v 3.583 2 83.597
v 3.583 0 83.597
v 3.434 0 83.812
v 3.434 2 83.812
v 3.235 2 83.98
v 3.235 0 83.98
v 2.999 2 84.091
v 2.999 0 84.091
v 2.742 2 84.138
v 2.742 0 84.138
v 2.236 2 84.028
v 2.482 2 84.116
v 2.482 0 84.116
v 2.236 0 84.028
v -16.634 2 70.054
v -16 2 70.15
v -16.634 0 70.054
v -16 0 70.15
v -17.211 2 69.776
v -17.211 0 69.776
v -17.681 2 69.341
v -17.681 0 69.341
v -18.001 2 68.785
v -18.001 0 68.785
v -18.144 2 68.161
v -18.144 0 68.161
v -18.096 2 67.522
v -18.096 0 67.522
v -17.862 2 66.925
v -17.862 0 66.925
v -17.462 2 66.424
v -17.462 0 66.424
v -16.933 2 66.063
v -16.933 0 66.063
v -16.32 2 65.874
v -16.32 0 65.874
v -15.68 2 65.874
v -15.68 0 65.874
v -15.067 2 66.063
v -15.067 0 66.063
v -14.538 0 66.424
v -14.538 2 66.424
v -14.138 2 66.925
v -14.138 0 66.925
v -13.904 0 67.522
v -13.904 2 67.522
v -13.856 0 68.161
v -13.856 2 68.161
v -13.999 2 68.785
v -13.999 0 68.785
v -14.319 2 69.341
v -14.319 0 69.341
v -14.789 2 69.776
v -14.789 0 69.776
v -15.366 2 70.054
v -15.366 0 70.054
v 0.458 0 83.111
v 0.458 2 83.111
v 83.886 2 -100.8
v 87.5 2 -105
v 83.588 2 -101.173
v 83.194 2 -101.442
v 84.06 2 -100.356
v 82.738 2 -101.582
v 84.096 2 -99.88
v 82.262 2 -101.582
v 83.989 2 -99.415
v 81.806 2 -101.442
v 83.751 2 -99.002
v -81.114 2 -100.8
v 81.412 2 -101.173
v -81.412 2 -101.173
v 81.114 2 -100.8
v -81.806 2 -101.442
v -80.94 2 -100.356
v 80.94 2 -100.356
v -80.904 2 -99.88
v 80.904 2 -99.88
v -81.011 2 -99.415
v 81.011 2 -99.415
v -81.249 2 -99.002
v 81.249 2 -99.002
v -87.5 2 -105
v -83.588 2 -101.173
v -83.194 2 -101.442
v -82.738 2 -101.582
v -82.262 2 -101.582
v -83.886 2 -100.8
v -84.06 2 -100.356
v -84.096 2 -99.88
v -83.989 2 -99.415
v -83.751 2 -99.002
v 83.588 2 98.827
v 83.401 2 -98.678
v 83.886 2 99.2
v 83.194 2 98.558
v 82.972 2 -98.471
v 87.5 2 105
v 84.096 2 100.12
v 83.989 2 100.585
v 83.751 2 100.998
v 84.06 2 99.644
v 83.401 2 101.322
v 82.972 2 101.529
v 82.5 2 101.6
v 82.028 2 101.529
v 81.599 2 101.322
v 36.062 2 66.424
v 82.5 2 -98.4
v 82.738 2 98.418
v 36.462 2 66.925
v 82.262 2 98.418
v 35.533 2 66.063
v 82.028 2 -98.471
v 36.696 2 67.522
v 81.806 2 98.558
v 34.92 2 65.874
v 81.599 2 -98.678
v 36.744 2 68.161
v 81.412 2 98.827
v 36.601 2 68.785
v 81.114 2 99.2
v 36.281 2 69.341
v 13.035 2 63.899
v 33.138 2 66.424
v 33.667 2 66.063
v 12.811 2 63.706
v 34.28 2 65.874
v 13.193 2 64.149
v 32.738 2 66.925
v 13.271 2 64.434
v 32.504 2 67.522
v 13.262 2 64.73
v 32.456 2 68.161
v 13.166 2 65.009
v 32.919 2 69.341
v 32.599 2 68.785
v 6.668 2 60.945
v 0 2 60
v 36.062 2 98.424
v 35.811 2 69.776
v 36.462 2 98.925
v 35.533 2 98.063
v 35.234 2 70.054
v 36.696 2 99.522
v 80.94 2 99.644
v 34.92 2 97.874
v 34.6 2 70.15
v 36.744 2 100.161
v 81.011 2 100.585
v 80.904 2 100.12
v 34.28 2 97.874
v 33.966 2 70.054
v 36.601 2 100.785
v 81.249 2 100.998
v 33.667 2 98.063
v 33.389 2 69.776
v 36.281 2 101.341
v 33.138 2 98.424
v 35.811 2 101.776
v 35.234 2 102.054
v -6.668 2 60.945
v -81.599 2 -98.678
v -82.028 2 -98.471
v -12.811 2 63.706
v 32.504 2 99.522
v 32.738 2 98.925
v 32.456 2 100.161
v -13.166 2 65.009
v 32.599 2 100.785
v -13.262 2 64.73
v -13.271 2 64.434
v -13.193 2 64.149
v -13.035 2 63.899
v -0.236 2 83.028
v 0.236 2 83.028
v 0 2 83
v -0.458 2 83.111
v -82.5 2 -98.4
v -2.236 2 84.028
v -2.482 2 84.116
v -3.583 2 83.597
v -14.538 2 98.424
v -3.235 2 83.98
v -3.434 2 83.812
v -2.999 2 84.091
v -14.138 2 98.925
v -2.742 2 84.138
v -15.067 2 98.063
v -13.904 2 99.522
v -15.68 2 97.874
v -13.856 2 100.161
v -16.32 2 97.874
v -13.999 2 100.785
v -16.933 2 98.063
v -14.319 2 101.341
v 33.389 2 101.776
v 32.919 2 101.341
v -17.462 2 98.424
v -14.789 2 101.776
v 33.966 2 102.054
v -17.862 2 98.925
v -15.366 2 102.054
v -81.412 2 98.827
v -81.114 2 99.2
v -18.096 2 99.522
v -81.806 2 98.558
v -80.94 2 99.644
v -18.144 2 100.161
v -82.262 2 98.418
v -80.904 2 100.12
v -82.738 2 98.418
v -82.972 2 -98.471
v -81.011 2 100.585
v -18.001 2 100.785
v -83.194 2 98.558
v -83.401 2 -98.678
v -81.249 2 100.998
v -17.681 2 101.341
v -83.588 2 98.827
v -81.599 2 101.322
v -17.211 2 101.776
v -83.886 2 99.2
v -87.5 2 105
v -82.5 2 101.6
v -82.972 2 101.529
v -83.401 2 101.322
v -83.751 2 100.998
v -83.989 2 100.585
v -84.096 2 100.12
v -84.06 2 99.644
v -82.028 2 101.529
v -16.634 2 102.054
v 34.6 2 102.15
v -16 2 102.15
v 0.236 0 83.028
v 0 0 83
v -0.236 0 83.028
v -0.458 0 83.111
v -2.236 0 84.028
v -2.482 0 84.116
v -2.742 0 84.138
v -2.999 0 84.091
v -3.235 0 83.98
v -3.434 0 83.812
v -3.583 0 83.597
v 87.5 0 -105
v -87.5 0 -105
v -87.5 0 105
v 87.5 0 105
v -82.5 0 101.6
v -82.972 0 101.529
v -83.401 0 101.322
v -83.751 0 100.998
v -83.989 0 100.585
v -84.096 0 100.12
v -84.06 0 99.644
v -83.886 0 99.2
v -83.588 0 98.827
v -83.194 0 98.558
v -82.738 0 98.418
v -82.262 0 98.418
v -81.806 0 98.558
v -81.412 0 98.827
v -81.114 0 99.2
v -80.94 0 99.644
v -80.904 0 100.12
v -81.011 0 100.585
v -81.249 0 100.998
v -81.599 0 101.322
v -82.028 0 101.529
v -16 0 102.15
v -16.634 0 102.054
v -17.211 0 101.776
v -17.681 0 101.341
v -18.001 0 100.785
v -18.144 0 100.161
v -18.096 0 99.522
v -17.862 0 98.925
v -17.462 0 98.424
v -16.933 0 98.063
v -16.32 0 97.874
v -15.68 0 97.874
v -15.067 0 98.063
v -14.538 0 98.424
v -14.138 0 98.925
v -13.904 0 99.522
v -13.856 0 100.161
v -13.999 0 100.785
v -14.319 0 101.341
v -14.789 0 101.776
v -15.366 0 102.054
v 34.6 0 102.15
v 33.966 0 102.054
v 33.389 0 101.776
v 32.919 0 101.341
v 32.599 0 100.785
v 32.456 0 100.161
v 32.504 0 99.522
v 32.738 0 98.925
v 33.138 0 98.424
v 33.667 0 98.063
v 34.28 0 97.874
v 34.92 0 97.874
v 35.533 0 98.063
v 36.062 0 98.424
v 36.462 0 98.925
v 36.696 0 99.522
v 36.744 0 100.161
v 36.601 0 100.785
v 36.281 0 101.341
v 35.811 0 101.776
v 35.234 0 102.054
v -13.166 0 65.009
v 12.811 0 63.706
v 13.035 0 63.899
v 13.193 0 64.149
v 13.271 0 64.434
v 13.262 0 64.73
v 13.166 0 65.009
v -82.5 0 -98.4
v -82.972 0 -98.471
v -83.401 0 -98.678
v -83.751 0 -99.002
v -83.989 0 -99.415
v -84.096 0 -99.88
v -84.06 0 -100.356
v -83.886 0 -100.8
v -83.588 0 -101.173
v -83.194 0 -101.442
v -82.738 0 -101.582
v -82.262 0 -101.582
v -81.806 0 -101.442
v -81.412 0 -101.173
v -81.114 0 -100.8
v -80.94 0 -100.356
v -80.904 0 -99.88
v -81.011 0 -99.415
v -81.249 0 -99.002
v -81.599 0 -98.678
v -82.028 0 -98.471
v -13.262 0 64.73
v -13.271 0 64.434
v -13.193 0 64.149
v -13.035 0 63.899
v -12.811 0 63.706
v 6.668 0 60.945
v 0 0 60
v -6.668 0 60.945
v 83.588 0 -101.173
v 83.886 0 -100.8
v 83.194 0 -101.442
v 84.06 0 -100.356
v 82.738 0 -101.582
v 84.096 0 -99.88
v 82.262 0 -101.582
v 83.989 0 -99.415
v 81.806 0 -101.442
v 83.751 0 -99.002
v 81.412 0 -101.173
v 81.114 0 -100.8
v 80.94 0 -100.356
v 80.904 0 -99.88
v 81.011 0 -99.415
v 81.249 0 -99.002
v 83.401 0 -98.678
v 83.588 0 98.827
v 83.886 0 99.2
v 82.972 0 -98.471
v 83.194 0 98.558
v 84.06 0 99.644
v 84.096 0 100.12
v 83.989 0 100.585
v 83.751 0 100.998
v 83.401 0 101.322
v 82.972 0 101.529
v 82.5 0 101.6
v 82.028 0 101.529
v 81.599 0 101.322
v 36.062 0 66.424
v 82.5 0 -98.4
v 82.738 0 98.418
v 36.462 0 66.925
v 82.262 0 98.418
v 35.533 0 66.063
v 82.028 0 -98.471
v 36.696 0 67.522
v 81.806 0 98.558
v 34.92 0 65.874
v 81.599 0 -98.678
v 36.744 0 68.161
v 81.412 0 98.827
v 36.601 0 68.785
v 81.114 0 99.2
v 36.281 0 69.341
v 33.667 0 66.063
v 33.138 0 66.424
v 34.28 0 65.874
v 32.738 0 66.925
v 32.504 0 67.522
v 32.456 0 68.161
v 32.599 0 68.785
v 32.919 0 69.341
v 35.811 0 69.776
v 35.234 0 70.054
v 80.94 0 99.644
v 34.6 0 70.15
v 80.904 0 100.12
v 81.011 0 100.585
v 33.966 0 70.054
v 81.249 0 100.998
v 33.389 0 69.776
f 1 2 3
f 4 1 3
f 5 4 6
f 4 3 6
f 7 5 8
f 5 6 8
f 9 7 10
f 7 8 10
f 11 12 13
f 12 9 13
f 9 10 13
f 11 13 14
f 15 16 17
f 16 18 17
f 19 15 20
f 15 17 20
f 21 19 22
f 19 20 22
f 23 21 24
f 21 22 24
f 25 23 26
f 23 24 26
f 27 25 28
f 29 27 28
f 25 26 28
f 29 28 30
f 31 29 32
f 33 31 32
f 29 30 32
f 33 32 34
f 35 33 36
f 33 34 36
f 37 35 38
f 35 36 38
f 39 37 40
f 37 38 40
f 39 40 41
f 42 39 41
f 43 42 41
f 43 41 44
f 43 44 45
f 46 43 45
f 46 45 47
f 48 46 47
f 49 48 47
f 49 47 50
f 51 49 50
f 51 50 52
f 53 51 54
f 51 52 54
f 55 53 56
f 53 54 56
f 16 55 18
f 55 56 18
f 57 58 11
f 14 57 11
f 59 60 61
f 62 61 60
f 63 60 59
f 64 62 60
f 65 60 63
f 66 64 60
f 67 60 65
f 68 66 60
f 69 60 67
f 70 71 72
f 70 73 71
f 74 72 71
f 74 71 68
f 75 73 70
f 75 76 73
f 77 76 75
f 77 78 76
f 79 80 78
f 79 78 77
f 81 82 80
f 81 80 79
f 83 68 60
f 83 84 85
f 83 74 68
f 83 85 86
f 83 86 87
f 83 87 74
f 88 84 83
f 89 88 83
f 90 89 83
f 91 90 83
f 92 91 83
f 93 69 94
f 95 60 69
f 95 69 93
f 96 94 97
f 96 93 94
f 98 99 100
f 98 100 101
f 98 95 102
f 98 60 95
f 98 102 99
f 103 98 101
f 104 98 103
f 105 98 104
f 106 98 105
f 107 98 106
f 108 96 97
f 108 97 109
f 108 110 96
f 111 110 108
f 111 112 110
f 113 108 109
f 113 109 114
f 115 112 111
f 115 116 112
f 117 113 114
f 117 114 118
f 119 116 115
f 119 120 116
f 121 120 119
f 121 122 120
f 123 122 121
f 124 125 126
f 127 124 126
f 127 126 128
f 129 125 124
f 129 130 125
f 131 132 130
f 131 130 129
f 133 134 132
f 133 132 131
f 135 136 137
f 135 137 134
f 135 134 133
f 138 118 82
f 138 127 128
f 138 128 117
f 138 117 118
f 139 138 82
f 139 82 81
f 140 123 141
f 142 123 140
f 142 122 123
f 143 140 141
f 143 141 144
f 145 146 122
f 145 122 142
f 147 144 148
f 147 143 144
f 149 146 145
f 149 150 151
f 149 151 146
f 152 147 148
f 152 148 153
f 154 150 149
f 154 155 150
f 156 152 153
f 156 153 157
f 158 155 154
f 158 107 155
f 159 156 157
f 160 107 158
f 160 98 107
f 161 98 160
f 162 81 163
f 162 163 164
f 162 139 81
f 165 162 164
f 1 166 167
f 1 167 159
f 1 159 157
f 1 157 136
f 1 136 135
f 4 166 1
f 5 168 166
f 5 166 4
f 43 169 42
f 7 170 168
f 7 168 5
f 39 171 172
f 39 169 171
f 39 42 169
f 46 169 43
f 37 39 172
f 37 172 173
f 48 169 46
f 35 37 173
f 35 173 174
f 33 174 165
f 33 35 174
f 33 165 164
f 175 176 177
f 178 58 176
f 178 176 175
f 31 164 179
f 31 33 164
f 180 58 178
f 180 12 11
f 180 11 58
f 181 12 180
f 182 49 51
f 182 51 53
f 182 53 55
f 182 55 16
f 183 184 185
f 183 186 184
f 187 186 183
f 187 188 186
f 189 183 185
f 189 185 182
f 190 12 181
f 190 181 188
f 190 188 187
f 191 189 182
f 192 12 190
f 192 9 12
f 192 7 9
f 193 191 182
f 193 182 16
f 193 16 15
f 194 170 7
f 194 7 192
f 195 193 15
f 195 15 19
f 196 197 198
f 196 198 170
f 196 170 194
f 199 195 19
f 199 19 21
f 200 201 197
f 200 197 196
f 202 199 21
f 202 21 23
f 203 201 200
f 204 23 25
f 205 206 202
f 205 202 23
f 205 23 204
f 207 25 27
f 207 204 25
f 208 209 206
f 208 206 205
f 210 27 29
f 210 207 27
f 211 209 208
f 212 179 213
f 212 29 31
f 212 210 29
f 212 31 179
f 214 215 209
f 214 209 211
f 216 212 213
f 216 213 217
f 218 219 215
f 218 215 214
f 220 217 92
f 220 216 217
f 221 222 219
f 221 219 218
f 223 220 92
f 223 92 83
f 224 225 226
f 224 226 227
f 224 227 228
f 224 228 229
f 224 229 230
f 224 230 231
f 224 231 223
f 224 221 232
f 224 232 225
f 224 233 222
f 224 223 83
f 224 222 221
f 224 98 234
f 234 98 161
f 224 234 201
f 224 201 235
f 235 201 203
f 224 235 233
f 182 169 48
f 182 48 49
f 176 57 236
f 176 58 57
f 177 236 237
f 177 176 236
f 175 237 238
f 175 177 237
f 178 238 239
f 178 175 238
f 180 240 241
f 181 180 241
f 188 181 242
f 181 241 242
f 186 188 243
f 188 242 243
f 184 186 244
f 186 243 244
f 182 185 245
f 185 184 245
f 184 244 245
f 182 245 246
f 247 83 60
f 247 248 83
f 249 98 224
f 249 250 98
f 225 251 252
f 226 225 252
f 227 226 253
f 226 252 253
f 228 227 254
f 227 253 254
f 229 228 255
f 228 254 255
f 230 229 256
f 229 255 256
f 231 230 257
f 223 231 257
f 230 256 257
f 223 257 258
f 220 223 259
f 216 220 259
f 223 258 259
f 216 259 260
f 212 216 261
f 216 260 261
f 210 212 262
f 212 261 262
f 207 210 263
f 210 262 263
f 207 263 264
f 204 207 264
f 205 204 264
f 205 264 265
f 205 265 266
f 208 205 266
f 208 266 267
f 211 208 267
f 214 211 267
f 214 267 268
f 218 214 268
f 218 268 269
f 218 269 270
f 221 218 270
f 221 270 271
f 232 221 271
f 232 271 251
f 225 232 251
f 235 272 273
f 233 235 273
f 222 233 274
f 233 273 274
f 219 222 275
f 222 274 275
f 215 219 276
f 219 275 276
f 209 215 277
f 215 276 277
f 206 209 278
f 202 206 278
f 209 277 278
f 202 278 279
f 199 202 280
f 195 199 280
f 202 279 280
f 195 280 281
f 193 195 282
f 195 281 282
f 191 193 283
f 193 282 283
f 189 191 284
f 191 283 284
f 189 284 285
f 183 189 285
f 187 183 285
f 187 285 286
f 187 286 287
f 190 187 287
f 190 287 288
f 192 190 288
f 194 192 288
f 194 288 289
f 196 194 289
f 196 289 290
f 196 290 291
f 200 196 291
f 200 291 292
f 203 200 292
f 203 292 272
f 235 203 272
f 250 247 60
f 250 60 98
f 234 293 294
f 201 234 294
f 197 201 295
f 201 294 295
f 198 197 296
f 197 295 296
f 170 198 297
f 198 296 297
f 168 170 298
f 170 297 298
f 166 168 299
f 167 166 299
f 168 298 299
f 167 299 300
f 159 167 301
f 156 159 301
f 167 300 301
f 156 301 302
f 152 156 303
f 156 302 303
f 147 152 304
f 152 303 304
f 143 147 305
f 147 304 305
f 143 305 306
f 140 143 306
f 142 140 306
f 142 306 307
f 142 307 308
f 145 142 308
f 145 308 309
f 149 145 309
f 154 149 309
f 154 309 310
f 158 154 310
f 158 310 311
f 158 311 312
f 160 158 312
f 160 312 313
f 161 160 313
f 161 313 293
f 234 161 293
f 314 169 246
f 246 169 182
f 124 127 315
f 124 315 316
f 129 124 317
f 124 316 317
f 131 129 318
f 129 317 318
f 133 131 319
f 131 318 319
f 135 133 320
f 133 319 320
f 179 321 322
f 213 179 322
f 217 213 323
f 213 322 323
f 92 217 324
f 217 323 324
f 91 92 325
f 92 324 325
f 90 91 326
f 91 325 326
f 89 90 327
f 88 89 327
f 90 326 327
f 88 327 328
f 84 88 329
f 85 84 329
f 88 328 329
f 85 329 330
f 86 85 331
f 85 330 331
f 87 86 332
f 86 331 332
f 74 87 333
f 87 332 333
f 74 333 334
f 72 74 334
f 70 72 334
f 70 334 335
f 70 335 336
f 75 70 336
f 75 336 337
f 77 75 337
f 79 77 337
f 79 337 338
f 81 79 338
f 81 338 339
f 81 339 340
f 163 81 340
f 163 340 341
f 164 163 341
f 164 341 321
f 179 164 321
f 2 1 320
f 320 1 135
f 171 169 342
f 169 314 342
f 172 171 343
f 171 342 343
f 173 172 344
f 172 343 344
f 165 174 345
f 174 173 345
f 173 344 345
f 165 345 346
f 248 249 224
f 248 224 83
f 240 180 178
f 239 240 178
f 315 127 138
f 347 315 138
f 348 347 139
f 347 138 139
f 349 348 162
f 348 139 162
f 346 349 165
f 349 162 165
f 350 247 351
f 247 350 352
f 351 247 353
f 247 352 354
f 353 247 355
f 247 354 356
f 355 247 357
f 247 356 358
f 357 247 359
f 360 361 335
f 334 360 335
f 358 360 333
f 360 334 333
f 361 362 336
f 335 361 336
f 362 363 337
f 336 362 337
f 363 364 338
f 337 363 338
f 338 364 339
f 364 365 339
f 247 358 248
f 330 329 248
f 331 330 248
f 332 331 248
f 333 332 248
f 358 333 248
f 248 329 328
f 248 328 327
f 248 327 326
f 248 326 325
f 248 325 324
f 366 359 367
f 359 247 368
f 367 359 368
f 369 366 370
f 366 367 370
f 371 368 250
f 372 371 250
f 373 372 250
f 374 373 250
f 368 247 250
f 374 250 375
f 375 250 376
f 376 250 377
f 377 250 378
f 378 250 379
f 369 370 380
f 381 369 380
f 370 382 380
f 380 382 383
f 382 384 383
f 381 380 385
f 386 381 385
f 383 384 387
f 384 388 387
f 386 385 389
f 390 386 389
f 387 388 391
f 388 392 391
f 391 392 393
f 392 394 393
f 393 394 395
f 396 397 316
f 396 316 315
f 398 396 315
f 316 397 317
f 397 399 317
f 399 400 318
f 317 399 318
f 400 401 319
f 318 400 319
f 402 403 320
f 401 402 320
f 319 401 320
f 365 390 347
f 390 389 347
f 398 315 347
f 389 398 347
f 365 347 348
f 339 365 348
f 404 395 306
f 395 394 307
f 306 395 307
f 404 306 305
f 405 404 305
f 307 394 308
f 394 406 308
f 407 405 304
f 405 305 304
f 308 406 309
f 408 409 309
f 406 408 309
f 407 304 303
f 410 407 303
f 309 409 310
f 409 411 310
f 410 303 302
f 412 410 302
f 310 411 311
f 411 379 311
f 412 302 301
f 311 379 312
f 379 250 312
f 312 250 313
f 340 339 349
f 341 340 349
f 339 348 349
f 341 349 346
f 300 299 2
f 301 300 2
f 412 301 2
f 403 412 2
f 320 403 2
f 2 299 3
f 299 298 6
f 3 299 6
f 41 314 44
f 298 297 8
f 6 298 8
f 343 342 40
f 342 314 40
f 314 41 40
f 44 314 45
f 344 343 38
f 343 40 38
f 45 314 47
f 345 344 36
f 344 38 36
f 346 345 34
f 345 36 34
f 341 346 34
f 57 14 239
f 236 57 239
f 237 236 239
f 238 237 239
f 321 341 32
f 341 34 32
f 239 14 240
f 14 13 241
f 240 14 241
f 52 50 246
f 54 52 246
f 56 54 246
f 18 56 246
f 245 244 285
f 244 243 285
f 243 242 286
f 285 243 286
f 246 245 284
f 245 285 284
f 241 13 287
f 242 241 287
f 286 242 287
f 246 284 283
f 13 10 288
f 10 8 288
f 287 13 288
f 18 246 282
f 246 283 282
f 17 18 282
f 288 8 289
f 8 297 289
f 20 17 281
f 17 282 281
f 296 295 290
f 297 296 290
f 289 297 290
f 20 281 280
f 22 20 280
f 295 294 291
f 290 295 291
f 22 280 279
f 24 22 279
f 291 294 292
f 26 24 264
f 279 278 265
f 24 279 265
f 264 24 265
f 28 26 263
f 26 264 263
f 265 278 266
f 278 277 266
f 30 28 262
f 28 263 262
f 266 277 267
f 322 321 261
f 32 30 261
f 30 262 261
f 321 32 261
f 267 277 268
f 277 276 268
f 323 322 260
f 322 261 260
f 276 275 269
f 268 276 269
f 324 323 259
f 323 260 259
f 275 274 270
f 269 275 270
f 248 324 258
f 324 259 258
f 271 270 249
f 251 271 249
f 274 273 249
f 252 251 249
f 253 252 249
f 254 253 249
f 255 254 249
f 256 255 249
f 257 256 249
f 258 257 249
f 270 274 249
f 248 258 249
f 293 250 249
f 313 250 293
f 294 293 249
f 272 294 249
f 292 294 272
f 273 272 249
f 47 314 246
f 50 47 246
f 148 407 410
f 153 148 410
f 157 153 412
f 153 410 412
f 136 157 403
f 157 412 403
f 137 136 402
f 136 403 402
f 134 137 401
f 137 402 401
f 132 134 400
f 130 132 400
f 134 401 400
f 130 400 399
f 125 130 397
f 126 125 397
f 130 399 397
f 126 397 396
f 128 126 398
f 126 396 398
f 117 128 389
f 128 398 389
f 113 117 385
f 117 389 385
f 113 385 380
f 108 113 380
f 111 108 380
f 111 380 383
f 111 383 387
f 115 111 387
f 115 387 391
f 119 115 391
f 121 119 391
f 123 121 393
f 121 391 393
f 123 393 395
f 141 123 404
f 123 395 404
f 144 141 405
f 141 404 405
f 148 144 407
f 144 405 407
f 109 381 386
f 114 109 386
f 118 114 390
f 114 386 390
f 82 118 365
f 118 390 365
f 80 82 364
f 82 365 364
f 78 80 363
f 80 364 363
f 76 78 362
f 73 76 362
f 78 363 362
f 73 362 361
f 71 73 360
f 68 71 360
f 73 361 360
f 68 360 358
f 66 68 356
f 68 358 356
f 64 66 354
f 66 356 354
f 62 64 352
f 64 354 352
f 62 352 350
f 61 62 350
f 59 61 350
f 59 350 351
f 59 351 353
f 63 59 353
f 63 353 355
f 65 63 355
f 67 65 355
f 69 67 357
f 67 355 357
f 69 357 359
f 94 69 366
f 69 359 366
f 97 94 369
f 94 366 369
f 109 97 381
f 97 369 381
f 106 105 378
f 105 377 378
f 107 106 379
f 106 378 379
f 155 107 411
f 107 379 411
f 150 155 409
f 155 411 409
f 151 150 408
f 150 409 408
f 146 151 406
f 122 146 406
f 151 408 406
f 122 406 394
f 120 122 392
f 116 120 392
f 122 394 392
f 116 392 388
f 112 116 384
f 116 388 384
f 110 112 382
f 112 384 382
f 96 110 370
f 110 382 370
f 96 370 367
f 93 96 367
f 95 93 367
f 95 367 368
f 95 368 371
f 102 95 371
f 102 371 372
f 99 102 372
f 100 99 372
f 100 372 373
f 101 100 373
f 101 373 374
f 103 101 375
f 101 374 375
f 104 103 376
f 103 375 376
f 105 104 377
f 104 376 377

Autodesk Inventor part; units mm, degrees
ref_plane "YZ Plane" through (0, 0, 0) normal (1, 0, 0) x (0, 1, 0)
ref_plane "XZ Plane" through (0, 0, 0) normal (0, 1, 0) x (-1, 0, 0)
ref_plane "XY Plane" through (0, 0, 0) normal (0, 0, 1) x (1, 0, 0)
sketch "スケッチ1" plane through (0, 0, 0) normal (0, 1, 0) x (-1, 0, 0)
  line L0 (-87.5, 105) -> (87.5, 105)
  line L1 (87.5, 105) -> (87.5, -105)
  line L2 (87.5, -105) -> (-87.5, -105)
  line L3 (-87.5, -105) -> (-87.5, 105)
  line L4 (-87.5, 105) -> (87.5, -105) construction
  line L5 (87.5, 105) -> (-87.5, -105) construction
  point P0 (0, 0)
  dimension "d0" = 210
  dimension "d1" = 175
extrude "プレート1" add sketch "スケッチ1" along normal blind 2
sketch "スケッチ5" plane through (0, 2, 0) normal (0, 1, 0) x (1, 0, 0)
  line L0 (-16, -100) -> (34.6, -100)
  line L1 (34.6, -100) -> (34.6, -68)
  line L2 (34.6, -68) -> (-16, -68)
  line L3 (-16, -68) -> (-16, -100)
  line L4 (-16, -100) -> (34.6, -68) construction
  line L5 (34.6, -100) -> (-16, -68) construction
  line L6 (87.5, -105) -> (-87.5, -105) projected
  point P0 (0, 0)
  point P1 (0, -84)
  point P2 (9.3, -84)
  point P3 (9.3, -84)
  dimension "d31" = 50.6
  dimension "d32" = 16
  dimension "d33" = 32
  dimension "d34" = 21
hole "穴3" at (34.6, 2, 68) at (34.6, 2, 100) at (-16, 2, 68) at (-16, 2, 100) direction (0, -1, 0) diameter 4.3 end through all clearance for "Socket Head Cap Screw" size "M4" standard "Ansi Metric M Profile"
sketch "スケッチ6" plane through (0, 2, 0) normal (0, 1, 0) x (1, 0, 0)
  line L0 (-87.5, -251.5284) -> (85.7224, 84.4449)
  line L1 (85.7224, 84.4449) -> (87.5, 83.5284)
  line L2 (87.5, 83.5284) -> (-85.7224, -252.4449)
  line L3 (-85.7224, -252.4449) -> (-87.5, -251.5284)
  line L4 (-87.5, -251.5284) -> (87.5, 83.5284) construction
  line L5 (85.7224, 84.4449) -> (-85.7224, -252.4449) construction
  line L6 (87.5, -251.5284) -> (-85.7224, 84.4449)
  line L7 (-85.7224, 84.4449) -> (-87.5, 83.5284)
  line L8 (-87.5, 83.5284) -> (85.7224, -252.4449)
  line L9 (85.7224, -252.4449) -> (87.5, -251.5284)
  line L10 (87.5, -251.5284) -> (-87.5, 83.5284) construction
  line L11 (-85.7224, 84.4449) -> (85.7224, -252.4449) construction
  line L12 (-2.2636, -81.7918) -> (-0.486, -80.8753)
  circle A0 centre (0, -84) radius 22
  line L13 (2.2636, -81.7918) -> (0.486, -80.8753)
  circle A1 centre (0, -84) radius 3
  line L14 (-87.5, -105) -> (-87.5, 105) projected
  line L15 (87.5, 105) -> (87.5, -105) projected
  point P0 (0, 0)
  point P1 (0, -84)
  point P2 (-1.3748, -81.3335)
  point P3 (1.3748, -81.3335)
  point P4 (10.9601, -64.9245)
  point P5 (-10.9601, -64.9245)
  dimension "d54" = 2
  dimension "d55" = 2
  dimension "d57" = 44
  dimension "d59" = 3
  dimension "d60" = 3
  dimension "d65" = 186
  dimension "d66" = 186
extrude "押し出し2" cut sketch "スケッチ6" against normal blind 10 contours A0 L6 L12 L8 | A0 L0 A1 L6 | L12 L6 A1 | A0 L2 L13 L0 | L0 L13 A1
sketch "スケッチ7" plane through (0, 2, 0) normal (0, 1, 0) x (1, 0, 0)
  line L0 (-82.5, -100) -> (82.5, -100)
  line L1 (82.5, -100) -> (82.5, 100)
  line L2 (82.5, 100) -> (-82.5, 100)
  line L3 (-82.5, 100) -> (-82.5, -100)
  line L4 (-82.5, -100) -> (82.5, 100) construction
  line L5 (82.5, -100) -> (-82.5, 100) construction
  line L6 (-87.5, -105) -> (-87.5, 105) projected
  line L7 (87.5, -105) -> (-87.5, -105) projected
  point P0 (0, 0)
  dimension "d45" = 5
  dimension "d46" = 5
hole "穴4" at (-82.5, 2, -100) at (82.5, 2, -100) at (-82.5, 2, 100) at (82.5, 2, 100) direction (0, -1, 0) diameter 3.2 end through all clearance for "Socket Head Cap Screw" size "M3" standard "Ansi Metric M Profile"
sketch "スケッチ8" plane through (0, 2, 0) normal (0, 1, 0) x (1, 0, 0)
  line L0 (10.9601, -64.9245) -> (2.2636, -81.7918) projected
  line L1 (-1.3748, -81.3335) -> (-2.2636, -81.7918) projected
  arc A0 (1.3748, -81.3335) -> (-1.3748, -81.3335) centre (0, -84) ccw projected
  line L2 (2.2636, -81.7918) -> (1.3748, -81.3335) projected
  line L3 (-2.2636, -81.7918) -> (-10.9601, -64.9245) projected
  arc A1 (10.9601, -64.9245) -> (-10.9601, -64.9245) centre (0, -84) ccw projected
  line L4 (3.1247, -84.486) -> (13.5784, -64.2105)
  arc A2 (13.5784, -64.2105) -> (-13.5784, -64.2105) centre (0, -84) ccw
  line L5 (-13.5784, -64.2105) -> (-3.1247, -84.486)
  line L6 (-3.1247, -84.486) -> (-0.4583, -83.1112)
  arc A3 (0.4583, -83.1112) -> (-0.4583, -83.1112) centre (0, -84) ccw
  line L7 (0.4583, -83.1112) -> (3.1247, -84.486)
  point P0 (0, 0)
  dimension "d61" = 2
extrude "押し出し3" cut sketch "スケッチ8" against normal blind 10 contours L0 L2 A0 L1 L3 A1 | L7 A3 L6 L5 A2 L4
fillet "コーナーR1" radius 1 4 edges at (-3.1247, 1, 84.486) (3.1247, 1, 84.486) (-13.5784, 1, 64.2105) (13.5784, 1, 64.2105)
equation "\"d40\" = Thickness"
equation "\"d60\" = d59"
equation "\"d66\" = d65"
equation "\"d2\" = Thickness"
equation "\"BendRadius\" = Thickness"
equation "\"BendReliefWidth\" = Thickness"
equation "\"BendReliefDepth\" = 0.5 * Thickness"
equation "\"CornerReliefSize\" = 4 * Thickness"
equation "\"MinimumRemnant\" = 2 * Thickness"
equation "\"TransitionRadius\" = BendRadius"
equation "\"JacobiRadiusSize\" = BendRadius"
equation "\"GapSize\" = Thickness"
equation "\"Thickness\" = 2"
properties part number "s_carbon_plate1" material "ABS プラスチック"
